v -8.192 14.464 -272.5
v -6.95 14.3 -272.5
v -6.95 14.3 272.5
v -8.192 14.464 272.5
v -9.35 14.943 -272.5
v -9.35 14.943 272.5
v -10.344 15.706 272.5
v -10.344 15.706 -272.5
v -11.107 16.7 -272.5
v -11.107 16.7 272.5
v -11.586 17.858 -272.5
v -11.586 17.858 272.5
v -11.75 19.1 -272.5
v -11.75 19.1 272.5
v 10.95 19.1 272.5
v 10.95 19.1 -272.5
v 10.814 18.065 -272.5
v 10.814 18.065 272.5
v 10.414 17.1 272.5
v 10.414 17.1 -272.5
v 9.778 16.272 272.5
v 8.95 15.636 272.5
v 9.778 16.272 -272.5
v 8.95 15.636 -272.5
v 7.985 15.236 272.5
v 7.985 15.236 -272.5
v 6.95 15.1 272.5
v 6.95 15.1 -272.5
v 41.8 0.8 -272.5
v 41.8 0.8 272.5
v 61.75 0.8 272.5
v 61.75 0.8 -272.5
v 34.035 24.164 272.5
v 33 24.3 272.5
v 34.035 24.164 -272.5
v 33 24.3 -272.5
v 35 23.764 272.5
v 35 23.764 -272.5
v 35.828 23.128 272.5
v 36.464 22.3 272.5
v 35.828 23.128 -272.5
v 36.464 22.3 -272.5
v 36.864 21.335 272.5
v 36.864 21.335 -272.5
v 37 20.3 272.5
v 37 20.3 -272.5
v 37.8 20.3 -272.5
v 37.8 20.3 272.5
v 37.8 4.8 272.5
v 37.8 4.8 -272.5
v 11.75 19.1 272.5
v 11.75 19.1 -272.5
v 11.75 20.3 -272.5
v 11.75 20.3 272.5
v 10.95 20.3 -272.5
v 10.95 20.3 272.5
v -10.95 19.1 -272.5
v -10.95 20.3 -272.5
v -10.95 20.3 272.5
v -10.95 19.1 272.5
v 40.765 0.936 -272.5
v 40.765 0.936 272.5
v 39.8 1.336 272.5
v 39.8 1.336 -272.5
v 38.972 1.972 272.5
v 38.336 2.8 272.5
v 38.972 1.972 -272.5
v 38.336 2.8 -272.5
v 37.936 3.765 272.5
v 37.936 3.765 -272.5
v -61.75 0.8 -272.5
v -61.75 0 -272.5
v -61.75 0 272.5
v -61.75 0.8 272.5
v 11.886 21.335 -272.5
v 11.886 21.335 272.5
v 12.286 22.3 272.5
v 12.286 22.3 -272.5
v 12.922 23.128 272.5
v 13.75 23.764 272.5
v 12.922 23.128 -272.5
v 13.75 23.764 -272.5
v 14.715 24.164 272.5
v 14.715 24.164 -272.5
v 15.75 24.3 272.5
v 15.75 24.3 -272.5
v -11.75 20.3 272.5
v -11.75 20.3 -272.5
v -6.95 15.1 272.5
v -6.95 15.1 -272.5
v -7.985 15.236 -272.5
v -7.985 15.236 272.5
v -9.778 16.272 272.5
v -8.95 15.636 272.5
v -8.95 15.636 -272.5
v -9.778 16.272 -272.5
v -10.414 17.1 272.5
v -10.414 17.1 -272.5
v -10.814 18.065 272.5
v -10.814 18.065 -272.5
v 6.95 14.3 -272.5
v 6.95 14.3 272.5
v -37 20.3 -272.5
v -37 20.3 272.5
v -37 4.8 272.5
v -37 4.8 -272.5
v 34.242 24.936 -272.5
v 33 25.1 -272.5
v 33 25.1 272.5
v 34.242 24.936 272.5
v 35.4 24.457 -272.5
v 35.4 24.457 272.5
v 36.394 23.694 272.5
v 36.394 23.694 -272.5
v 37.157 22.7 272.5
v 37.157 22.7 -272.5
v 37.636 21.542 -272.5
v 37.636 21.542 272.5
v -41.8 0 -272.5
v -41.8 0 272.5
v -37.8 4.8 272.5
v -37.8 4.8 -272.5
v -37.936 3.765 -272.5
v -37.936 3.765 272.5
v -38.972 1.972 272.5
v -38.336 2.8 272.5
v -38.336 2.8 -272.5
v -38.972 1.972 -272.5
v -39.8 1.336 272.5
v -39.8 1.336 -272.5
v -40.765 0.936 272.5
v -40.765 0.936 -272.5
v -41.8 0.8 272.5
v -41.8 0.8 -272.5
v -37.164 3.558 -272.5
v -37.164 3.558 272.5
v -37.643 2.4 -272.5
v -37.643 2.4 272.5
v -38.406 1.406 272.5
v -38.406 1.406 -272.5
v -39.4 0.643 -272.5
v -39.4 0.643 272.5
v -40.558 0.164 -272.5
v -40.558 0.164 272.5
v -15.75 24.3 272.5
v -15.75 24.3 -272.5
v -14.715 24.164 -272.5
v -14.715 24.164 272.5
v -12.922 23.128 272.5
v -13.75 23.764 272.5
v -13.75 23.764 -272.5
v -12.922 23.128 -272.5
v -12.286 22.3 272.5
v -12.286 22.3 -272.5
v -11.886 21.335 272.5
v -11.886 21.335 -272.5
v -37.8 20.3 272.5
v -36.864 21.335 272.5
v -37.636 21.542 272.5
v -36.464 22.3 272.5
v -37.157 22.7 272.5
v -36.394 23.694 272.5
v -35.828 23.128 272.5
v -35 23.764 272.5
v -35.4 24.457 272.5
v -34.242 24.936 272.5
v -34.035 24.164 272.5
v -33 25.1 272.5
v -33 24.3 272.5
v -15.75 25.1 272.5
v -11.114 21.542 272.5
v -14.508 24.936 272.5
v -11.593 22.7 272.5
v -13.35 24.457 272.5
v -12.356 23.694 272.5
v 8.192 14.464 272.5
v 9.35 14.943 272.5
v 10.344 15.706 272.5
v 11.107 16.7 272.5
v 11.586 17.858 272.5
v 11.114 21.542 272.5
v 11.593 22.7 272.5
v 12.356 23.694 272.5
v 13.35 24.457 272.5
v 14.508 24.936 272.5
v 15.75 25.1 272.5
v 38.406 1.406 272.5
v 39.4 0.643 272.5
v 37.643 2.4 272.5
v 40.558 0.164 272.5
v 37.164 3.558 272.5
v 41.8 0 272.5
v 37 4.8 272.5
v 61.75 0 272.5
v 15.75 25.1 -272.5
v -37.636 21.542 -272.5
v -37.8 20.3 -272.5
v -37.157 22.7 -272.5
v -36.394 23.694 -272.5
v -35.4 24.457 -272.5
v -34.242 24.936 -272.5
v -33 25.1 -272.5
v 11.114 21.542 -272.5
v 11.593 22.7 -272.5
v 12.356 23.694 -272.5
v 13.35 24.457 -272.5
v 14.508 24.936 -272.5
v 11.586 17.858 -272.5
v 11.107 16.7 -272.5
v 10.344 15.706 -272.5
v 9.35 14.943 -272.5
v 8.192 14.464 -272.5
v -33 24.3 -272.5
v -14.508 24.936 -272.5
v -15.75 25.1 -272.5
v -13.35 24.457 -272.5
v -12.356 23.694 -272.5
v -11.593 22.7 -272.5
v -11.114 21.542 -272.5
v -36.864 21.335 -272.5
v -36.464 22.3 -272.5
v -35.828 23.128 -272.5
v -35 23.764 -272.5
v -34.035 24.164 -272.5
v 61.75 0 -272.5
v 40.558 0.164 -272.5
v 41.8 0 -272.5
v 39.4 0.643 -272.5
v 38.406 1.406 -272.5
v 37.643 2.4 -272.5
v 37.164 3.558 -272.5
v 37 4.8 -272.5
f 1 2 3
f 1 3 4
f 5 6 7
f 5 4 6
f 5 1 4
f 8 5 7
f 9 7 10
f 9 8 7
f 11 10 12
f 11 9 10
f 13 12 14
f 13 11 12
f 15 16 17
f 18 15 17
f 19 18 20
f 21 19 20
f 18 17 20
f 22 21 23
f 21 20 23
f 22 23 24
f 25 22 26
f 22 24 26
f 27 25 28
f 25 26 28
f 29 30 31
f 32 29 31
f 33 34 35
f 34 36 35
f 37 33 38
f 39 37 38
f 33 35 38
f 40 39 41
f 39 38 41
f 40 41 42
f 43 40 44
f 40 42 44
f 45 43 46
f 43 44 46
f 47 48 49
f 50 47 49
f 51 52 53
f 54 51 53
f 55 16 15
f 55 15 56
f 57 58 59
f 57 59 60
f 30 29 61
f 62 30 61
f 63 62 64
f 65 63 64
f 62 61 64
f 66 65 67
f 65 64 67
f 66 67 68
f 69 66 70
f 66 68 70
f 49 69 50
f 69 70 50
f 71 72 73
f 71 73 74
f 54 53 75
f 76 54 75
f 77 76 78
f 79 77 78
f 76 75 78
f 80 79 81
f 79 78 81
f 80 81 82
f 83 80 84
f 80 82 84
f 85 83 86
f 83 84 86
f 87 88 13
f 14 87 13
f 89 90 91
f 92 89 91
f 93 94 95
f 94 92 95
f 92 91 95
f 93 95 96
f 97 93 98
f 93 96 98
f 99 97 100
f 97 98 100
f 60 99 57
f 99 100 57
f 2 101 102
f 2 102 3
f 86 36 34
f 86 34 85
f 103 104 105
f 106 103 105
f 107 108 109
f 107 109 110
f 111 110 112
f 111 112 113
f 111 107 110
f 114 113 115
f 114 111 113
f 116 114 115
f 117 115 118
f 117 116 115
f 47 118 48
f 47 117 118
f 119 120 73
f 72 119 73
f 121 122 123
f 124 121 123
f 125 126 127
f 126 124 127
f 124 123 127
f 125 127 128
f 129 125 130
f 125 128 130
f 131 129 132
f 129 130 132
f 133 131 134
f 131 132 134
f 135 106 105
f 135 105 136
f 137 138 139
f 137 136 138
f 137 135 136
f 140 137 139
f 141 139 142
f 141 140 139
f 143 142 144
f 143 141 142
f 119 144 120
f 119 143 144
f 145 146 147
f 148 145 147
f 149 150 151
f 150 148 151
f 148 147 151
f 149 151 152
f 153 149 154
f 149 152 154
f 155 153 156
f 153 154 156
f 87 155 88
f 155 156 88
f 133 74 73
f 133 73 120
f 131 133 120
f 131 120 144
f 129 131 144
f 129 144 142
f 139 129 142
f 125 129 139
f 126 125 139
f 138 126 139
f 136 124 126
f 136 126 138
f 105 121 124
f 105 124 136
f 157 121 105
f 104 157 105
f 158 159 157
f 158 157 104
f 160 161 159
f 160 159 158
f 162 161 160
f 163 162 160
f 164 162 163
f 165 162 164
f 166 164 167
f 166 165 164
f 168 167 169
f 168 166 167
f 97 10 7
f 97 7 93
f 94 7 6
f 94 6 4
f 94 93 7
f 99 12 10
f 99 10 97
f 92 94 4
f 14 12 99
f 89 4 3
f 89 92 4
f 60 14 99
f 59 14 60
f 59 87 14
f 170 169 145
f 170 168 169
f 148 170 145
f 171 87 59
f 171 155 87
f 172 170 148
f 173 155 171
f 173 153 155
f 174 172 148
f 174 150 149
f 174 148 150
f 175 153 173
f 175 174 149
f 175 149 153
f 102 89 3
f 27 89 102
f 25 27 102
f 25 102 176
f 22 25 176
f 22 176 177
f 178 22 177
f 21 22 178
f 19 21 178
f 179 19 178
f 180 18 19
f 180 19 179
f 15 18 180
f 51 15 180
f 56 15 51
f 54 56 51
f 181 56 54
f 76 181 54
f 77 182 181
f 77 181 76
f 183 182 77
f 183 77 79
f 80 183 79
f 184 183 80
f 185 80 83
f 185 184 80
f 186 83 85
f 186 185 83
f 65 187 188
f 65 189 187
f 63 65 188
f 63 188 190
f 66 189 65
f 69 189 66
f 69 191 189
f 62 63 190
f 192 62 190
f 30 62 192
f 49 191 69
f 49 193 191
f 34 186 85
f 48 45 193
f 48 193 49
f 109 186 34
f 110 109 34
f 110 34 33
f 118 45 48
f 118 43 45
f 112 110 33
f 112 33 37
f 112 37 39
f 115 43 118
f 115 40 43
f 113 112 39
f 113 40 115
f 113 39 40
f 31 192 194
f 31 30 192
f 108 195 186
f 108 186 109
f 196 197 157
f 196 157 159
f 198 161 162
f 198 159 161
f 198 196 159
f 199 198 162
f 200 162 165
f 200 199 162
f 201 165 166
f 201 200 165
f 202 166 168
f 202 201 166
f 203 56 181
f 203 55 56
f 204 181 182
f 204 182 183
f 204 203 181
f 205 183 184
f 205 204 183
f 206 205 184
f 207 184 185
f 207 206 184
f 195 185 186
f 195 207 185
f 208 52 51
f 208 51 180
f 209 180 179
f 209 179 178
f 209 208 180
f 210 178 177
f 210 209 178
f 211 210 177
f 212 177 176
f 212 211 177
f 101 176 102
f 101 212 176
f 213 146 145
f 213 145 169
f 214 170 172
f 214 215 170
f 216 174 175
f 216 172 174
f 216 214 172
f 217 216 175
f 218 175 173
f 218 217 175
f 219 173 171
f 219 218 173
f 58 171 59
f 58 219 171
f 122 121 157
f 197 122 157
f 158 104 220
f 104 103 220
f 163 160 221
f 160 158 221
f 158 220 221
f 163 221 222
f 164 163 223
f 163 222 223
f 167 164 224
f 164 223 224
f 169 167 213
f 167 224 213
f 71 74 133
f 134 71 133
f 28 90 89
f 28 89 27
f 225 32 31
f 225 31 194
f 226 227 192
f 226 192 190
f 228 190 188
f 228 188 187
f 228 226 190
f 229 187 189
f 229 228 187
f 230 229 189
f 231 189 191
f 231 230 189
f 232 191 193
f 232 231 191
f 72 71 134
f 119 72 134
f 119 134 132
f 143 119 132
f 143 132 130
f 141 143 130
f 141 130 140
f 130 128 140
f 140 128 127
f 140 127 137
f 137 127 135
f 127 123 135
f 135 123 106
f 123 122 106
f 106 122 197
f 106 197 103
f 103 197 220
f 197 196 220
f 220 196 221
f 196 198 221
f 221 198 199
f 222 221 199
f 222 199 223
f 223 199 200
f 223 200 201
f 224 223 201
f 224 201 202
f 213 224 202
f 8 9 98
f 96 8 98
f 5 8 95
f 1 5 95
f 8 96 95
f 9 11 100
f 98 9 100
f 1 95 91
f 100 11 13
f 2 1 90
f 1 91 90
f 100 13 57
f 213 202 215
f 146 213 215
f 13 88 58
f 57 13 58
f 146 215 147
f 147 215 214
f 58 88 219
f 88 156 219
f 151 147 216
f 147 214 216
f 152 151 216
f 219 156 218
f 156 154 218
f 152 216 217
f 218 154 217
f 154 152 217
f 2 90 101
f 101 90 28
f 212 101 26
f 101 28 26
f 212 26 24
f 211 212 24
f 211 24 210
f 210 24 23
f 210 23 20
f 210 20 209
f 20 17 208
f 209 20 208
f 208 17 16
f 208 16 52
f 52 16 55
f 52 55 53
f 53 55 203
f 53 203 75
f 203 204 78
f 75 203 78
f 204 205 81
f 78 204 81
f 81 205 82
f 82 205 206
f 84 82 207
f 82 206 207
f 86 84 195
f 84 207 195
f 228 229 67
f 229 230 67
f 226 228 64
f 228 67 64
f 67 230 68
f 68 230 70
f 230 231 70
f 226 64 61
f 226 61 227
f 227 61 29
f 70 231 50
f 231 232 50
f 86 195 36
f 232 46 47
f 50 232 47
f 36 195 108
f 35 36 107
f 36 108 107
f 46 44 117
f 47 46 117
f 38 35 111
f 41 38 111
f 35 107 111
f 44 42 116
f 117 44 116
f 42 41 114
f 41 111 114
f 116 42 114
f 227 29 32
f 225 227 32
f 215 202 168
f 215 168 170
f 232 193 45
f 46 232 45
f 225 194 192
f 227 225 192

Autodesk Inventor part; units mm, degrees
ref_plane "YZ Plane" through (0, 0, 0) normal (1, 0, 0) x (0, 1, 0)
ref_plane "XZ Plane" through (0, 0, 0) normal (0, 1, 0) x (-1, 0, 0)
ref_plane "XY Plane" through (0, 0, 0) normal (0, 0, 1) x (1, 0, 0)
sketch "Sketch1" plane through (0, 0, 0) normal (0, 0, 1) x (1, 0, 0)
  line L0 (-41.8, 0) -> (-61.75, 0)
  line L1 (-15.75, 24.3) -> (-33, 24.3)
  line L2 (0, 14.3) -> (-6.95, 14.3)
  line L3 (-11.75, 20.3) -> (-11.75, 19.1)
  line L4 (-37, 20.3) -> (-37, 4.8)
  arc A0 (-11.75, 19.1) -> (-6.95, 14.3) centre (-6.95, 19.1) ccw
  arc A1 (-11.75, 20.3) -> (-15.75, 24.3) centre (-15.75, 20.3) ccw
  arc A2 (-33, 24.3) -> (-37, 20.3) centre (-33, 20.3) ccw
  arc A3 (-41.8, 0) -> (-37, 4.8) centre (-41.8, 4.8) ccw
  line L5 (-61.75, 0.8) -> (-41.8, 0.8)
  arc A4 (-41.8, 0.8) -> (-37.8, 4.8) centre (-41.8, 4.8) ccw
  line L6 (-37.8, 4.8) -> (-37.8, 20.3)
  arc A5 (-33, 25.1) -> (-37.8, 20.3) centre (-33, 20.3) ccw
  line L7 (-33, 25.1) -> (-15.75, 25.1)
  arc A6 (-10.95, 20.3) -> (-15.75, 25.1) centre (-15.75, 20.3) ccw
  line L8 (-10.95, 20.3) -> (-10.95, 19.1)
  arc A7 (-10.95, 19.1) -> (-6.95, 15.1) centre (-6.95, 19.1) ccw
  line L9 (-6.95, 15.1) -> (0, 15.1)
  line L10 (-61.75, 0) -> (-61.75, 0.8)
  line L11 (0, 0) -> (0, 9.3563)
  line L12 (0, 14.3) -> (0, 15.1)
  dimension "d0" = 14.3
  dimension "d2" = 24.3
  dimension "d4" = 25.25
  dimension "d5" = 4.8
  dimension "d6" = 4
  dimension "d8" = 0.8
  dimension "d11" = 6.95
  dimension "d12" = 19.95
extrude "Extrusion1" add sketch "Sketch1" along normal mid plane 545
mirror "Mirror1" about plane through (0, 0, 0) normal (1, 0, 0) of "Extrusion1"
properties part number "AAD0001106802"
